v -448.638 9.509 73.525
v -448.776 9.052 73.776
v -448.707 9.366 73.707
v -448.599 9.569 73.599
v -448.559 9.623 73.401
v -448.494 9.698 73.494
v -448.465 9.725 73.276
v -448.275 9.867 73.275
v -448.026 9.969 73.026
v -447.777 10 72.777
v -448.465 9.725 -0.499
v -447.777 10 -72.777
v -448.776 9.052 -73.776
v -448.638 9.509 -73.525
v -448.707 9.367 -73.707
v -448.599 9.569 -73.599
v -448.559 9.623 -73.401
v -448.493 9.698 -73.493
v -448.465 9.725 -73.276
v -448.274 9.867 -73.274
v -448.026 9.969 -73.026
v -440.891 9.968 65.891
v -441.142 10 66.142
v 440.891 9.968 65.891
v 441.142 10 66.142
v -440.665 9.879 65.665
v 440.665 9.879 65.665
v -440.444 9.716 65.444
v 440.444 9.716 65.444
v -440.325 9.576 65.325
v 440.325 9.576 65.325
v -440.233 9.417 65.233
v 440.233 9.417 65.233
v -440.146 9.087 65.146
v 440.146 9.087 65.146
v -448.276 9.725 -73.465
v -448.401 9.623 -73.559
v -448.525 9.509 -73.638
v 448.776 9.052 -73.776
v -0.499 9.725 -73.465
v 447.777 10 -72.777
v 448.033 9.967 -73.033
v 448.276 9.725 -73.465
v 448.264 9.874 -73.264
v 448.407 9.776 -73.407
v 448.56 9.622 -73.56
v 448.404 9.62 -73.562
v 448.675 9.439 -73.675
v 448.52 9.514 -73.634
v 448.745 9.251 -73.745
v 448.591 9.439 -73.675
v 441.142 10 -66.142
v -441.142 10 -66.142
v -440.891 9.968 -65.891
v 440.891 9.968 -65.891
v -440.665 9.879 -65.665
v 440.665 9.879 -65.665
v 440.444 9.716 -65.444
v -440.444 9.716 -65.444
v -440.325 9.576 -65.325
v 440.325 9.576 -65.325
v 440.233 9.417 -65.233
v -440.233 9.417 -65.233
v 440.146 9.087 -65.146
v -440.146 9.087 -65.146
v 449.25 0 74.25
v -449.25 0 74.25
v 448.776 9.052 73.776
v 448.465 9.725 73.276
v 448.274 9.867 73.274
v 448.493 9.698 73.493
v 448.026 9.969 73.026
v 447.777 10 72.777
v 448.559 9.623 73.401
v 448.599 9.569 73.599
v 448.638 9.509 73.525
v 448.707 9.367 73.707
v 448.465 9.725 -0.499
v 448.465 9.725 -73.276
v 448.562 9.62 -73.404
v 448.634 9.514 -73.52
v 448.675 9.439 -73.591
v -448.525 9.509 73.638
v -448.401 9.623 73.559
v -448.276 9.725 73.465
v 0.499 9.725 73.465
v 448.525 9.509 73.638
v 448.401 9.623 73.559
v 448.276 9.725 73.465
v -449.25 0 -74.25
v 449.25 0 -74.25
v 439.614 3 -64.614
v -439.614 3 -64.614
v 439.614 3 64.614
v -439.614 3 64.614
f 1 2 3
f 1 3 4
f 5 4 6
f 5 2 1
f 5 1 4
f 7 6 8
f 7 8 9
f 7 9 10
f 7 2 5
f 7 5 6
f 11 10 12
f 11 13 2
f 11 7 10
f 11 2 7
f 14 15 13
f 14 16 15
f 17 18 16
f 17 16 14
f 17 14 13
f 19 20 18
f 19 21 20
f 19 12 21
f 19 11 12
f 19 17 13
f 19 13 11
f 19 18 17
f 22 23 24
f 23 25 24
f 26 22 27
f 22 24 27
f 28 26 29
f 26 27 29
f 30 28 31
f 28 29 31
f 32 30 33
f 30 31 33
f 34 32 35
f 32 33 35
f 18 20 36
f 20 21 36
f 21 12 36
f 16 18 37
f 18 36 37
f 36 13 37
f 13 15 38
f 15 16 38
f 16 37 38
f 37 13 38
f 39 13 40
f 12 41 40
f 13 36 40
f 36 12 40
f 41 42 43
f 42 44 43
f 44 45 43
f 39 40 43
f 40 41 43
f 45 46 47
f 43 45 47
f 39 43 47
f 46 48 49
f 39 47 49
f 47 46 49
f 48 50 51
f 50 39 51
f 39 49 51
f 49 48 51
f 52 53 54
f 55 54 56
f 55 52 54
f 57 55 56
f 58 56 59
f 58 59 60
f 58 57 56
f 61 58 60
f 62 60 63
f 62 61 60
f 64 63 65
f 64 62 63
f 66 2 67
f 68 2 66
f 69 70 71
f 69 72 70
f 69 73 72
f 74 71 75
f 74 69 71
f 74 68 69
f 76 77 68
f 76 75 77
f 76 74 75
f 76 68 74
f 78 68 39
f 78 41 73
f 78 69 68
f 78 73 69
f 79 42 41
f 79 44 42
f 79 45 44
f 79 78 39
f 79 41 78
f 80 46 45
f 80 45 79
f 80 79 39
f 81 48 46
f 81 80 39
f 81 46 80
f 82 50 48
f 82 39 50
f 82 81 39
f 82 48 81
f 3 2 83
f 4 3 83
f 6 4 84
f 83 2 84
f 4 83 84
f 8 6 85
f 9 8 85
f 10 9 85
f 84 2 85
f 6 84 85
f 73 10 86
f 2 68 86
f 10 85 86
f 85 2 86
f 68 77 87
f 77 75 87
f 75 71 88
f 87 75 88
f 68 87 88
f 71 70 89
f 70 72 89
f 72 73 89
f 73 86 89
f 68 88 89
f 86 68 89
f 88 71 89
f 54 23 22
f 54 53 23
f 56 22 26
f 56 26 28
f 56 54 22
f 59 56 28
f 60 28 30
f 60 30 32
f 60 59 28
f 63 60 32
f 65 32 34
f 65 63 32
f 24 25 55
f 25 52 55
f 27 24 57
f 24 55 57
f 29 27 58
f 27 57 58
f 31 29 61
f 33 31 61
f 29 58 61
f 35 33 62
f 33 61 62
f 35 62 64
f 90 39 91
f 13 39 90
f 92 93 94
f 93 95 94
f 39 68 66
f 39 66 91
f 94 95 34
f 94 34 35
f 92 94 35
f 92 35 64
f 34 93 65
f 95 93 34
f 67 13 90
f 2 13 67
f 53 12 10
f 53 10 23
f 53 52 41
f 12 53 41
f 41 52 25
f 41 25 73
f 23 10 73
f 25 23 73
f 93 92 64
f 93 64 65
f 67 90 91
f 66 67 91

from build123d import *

# Parameters (mm, degrees)
SKETCH1_W           = 898.5
SKETCH1_H           = 148.5
BOSS_EXTRUDE1_DEPTH = 10
BOSS_EXTRUDE1_TAPER = 3
SKETCH2_W           = 880.451844414
SKETCH2_H           = 130.451844414
CUT_EXTRUDE1_DEPTH  = 7
CUT_EXTRUDE1_TAPER  = 5
FILLET1_R           = 1


with BuildPart() as part:
    # Sketch1 → Boss-Extrude1 (new body)
    with BuildSketch(Plane(origin=(0, 0, 0), x_dir=(1, 0, 0), z_dir=(0, 1, 0))):
        Rectangle(SKETCH1_W, SKETCH1_H)
    extrude(amount=BOSS_EXTRUDE1_DEPTH, taper=BOSS_EXTRUDE1_TAPER)

    # Sketch2 → Cut-Extrude1 (cut)
    with BuildSketch(Plane(origin=(0, 10, 0), x_dir=(1, 0, 0), z_dir=(0, 1, 0))):
        Rectangle(SKETCH2_W, SKETCH2_H)
    extrude(amount=-CUT_EXTRUDE1_DEPTH, taper=CUT_EXTRUDE1_TAPER, mode=Mode.SUBTRACT)

    # Fillet1
    fillet1_edges = [part.edges().sort_by_distance(p)[0] for p in [
        (-448.725922207, 10, 0),
        (0, 10, 73.725922207),
        (440.225922207, 10, 0),
        (0, 10, -65.225922207),
        (-440.225922207, 10, 0),
        (0, 10, 65.225922207),
        (448.725922207, 10, 0),
        (0, 10, -73.725922207),
    ]]
    fillet(fillet1_edges, radius=FILLET1_R)


solid = part.part
